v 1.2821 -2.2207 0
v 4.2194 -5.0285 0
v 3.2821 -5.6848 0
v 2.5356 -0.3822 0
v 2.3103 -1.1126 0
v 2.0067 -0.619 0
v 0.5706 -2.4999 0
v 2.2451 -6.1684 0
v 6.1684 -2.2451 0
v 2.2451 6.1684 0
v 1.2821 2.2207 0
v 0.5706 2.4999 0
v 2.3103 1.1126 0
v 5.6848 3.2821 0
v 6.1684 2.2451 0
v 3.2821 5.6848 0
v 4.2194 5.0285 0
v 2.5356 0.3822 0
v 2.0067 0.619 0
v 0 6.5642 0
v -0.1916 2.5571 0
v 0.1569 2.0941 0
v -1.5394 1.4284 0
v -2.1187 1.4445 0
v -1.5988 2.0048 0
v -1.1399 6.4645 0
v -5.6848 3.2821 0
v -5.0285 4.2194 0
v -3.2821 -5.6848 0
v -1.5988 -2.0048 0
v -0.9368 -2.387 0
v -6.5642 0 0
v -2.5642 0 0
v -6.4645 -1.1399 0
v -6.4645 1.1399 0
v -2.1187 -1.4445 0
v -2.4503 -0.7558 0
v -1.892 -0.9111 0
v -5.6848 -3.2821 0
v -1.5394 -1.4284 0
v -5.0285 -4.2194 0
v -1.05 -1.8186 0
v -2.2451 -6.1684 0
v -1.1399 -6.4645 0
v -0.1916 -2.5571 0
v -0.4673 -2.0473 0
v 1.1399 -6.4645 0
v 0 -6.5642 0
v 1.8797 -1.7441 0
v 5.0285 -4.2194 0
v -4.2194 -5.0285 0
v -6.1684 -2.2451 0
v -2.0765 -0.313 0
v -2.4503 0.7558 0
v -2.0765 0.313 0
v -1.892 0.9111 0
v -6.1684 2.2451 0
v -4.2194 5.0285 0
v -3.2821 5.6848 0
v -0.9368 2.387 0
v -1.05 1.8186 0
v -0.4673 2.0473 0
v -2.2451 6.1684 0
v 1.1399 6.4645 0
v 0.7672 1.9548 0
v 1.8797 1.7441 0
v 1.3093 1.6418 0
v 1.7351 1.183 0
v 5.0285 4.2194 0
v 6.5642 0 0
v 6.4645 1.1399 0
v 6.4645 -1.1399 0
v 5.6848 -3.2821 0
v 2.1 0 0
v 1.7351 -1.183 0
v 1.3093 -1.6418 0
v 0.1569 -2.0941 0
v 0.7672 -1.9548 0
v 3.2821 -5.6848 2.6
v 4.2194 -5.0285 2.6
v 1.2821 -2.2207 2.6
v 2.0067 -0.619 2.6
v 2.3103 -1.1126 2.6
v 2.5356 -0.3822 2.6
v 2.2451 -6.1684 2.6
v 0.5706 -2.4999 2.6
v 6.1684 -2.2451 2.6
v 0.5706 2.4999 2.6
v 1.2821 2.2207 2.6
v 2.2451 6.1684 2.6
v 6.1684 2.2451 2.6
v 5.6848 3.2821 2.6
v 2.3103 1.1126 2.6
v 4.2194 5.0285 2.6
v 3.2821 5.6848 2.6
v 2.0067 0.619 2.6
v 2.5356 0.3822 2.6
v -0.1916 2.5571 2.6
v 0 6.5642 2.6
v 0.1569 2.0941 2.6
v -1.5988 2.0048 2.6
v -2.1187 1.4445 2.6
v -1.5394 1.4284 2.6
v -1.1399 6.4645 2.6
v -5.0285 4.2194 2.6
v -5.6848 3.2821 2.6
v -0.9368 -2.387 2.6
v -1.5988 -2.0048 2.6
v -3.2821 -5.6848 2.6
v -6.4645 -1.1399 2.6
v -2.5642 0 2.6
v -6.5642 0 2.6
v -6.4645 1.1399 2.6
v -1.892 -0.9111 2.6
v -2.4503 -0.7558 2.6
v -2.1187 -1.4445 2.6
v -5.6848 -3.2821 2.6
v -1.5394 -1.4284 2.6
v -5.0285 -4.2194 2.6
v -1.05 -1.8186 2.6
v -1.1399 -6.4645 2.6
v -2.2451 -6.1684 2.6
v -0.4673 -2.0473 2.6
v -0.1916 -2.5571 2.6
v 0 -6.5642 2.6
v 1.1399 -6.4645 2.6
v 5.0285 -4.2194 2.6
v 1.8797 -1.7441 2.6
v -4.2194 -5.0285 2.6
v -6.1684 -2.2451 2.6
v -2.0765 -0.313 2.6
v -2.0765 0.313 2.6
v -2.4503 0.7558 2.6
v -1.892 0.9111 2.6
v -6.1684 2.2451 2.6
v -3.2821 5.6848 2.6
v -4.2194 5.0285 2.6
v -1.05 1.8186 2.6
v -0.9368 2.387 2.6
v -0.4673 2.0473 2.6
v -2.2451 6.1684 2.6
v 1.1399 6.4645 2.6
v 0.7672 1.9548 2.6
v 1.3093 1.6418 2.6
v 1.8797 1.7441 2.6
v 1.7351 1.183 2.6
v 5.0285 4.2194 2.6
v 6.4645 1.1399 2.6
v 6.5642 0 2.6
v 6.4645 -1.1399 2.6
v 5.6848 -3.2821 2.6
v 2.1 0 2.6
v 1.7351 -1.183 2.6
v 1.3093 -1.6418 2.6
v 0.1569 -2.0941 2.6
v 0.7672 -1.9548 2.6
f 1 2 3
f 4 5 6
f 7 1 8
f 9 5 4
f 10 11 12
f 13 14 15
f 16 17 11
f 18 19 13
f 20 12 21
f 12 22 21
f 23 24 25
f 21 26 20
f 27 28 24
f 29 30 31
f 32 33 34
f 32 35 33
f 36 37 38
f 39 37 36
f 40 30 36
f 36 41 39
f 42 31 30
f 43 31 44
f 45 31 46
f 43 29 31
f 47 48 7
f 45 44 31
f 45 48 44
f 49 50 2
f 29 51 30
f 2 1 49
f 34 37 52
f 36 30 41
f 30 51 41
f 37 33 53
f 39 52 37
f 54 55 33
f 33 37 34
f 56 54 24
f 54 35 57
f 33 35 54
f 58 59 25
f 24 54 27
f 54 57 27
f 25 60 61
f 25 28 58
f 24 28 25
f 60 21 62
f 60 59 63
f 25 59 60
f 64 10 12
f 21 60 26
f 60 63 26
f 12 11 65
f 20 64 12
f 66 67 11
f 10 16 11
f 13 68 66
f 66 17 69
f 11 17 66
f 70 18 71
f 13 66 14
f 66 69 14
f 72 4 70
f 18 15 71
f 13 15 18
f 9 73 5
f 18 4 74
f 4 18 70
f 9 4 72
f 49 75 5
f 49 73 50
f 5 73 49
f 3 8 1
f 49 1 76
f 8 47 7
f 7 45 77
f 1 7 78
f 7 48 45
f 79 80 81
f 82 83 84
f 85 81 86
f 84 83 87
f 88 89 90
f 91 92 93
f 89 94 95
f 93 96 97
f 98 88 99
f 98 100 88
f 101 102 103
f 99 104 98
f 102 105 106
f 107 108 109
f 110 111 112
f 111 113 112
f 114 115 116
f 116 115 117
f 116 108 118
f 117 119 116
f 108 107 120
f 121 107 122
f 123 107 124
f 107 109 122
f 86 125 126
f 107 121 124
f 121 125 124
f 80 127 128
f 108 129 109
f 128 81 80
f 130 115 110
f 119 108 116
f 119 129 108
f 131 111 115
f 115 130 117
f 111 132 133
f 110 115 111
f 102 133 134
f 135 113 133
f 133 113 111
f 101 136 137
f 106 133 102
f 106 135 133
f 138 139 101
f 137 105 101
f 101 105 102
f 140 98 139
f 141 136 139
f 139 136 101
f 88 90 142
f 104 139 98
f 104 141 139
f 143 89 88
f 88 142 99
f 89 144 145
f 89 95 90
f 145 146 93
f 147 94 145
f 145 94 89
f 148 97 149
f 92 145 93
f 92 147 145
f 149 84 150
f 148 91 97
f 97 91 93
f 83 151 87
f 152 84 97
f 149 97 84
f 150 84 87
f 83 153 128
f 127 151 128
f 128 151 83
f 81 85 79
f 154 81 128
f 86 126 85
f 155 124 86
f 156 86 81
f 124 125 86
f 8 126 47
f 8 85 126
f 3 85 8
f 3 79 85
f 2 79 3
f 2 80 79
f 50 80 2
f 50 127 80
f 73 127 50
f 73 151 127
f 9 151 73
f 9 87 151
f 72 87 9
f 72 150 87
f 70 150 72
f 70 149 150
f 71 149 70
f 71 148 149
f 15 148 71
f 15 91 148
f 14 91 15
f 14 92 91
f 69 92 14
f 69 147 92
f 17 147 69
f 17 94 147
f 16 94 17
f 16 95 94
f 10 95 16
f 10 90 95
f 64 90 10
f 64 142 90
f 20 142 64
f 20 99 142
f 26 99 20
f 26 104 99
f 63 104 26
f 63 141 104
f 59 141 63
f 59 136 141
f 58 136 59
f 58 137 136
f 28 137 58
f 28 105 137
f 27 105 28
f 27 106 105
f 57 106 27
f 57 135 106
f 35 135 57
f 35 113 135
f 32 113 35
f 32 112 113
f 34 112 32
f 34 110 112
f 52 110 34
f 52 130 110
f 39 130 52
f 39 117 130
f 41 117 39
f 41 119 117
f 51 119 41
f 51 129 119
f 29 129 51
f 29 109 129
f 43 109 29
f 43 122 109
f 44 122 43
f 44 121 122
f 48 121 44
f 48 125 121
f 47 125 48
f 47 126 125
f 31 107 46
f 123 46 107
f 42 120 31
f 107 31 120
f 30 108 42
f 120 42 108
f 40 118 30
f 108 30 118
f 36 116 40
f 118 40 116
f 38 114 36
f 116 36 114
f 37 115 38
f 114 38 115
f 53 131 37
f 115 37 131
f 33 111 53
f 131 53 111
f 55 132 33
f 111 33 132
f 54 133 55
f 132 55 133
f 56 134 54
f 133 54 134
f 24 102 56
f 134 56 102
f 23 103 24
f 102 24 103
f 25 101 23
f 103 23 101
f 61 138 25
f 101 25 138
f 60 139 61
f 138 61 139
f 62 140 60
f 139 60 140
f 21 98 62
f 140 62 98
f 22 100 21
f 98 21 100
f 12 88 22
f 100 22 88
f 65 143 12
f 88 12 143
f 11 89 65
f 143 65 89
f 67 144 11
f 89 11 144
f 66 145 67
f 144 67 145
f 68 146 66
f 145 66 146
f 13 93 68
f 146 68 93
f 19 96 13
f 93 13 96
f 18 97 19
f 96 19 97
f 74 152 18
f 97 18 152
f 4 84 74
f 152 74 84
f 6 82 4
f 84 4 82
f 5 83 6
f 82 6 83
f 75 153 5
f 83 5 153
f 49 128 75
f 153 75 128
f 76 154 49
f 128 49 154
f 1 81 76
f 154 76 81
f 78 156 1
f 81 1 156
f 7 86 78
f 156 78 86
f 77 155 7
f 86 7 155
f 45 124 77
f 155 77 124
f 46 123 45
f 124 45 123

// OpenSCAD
module my_servo_spline(h=2.6) {
// Generate test plate for determining proper size, or spline alone for integrating into larger design
part = "spline"; // [ plate:Test Plate, spline:Spline Only ]

// How many points are on the spline (it's important that this is correct)
spline_count = 21;

// Estimated diameter of spline will be fine-tuned for a good fit
approximate_diameter = 4.2;

// First attempt, recommend 0.2 or greater, finer tuning recommend 0.1
step_size = 0.1;

module dummy() { }  // no more parameters

approx_od = approximate_diameter;
disc_size = approx_od+10;  // for purposes of plate generation...

stepmin = -4;
stepmax = 4;
xmid = (stepmin+stepmax)/2*(approx_od+8);

if (part == "plate") {
  for (i=[stepmin:stepmax]) {
    translate([i*(approx_od+8), 0, 0]) {
      spline_hole(approx_od + i*step_size);
      spline_plate(i);
    }
  }

  translate([xmid, 17, 0])
  linear_extrude(height=1)
  text(str("Nominal: ", approx_od, "  Step: ", step_size), 5, halign="center");
}
else {  // spline or anything else, just make the spline
  spline_hole(approx_od);
}


module spline_hole(inside_points_diameter = approx_od, label) {
  r1 = inside_points_diameter/2;
  // approximate distance along circumference from one bump to the next
  space = r1*sin(360/spline_count);
  r2 = r1 + space*0.75;  // pointy but not *too* pointy
  // about 4mm solid between outer points and outside disc, should be large enough to prevent 
  // slicers from being goofy about the space betewen the splines and the outside.
  disc_d = 2*r2 + 8;  
  
  linear_extrude(height=h)
  difference() {
    circle(d=disc_d, $fn=36);
    polygon([ 
      for (i=[1:2*spline_count])
        (i % 2 == 0) ? 
          [ r1*cos(i*360/(2*spline_count)), r1*sin(i*360/(2*spline_count)) ] : 
          [ r2*cos(i*360/(2*spline_count)), r2*sin(i*360/(2*spline_count)) ]
        ]);
  }
}


module spline_plate(label) {
  // text showing which value
  translate([0, disc_size/2+1, 0])
  linear_extrude(height=1)
  text(str(label), 5, halign="center");
  
  // flat plate on which to put text
  translate([-disc_size/2-2, -disc_size/2, -2])
  cube([disc_size+4, disc_size+18, 2]);
}
}

my_servo_spline();
